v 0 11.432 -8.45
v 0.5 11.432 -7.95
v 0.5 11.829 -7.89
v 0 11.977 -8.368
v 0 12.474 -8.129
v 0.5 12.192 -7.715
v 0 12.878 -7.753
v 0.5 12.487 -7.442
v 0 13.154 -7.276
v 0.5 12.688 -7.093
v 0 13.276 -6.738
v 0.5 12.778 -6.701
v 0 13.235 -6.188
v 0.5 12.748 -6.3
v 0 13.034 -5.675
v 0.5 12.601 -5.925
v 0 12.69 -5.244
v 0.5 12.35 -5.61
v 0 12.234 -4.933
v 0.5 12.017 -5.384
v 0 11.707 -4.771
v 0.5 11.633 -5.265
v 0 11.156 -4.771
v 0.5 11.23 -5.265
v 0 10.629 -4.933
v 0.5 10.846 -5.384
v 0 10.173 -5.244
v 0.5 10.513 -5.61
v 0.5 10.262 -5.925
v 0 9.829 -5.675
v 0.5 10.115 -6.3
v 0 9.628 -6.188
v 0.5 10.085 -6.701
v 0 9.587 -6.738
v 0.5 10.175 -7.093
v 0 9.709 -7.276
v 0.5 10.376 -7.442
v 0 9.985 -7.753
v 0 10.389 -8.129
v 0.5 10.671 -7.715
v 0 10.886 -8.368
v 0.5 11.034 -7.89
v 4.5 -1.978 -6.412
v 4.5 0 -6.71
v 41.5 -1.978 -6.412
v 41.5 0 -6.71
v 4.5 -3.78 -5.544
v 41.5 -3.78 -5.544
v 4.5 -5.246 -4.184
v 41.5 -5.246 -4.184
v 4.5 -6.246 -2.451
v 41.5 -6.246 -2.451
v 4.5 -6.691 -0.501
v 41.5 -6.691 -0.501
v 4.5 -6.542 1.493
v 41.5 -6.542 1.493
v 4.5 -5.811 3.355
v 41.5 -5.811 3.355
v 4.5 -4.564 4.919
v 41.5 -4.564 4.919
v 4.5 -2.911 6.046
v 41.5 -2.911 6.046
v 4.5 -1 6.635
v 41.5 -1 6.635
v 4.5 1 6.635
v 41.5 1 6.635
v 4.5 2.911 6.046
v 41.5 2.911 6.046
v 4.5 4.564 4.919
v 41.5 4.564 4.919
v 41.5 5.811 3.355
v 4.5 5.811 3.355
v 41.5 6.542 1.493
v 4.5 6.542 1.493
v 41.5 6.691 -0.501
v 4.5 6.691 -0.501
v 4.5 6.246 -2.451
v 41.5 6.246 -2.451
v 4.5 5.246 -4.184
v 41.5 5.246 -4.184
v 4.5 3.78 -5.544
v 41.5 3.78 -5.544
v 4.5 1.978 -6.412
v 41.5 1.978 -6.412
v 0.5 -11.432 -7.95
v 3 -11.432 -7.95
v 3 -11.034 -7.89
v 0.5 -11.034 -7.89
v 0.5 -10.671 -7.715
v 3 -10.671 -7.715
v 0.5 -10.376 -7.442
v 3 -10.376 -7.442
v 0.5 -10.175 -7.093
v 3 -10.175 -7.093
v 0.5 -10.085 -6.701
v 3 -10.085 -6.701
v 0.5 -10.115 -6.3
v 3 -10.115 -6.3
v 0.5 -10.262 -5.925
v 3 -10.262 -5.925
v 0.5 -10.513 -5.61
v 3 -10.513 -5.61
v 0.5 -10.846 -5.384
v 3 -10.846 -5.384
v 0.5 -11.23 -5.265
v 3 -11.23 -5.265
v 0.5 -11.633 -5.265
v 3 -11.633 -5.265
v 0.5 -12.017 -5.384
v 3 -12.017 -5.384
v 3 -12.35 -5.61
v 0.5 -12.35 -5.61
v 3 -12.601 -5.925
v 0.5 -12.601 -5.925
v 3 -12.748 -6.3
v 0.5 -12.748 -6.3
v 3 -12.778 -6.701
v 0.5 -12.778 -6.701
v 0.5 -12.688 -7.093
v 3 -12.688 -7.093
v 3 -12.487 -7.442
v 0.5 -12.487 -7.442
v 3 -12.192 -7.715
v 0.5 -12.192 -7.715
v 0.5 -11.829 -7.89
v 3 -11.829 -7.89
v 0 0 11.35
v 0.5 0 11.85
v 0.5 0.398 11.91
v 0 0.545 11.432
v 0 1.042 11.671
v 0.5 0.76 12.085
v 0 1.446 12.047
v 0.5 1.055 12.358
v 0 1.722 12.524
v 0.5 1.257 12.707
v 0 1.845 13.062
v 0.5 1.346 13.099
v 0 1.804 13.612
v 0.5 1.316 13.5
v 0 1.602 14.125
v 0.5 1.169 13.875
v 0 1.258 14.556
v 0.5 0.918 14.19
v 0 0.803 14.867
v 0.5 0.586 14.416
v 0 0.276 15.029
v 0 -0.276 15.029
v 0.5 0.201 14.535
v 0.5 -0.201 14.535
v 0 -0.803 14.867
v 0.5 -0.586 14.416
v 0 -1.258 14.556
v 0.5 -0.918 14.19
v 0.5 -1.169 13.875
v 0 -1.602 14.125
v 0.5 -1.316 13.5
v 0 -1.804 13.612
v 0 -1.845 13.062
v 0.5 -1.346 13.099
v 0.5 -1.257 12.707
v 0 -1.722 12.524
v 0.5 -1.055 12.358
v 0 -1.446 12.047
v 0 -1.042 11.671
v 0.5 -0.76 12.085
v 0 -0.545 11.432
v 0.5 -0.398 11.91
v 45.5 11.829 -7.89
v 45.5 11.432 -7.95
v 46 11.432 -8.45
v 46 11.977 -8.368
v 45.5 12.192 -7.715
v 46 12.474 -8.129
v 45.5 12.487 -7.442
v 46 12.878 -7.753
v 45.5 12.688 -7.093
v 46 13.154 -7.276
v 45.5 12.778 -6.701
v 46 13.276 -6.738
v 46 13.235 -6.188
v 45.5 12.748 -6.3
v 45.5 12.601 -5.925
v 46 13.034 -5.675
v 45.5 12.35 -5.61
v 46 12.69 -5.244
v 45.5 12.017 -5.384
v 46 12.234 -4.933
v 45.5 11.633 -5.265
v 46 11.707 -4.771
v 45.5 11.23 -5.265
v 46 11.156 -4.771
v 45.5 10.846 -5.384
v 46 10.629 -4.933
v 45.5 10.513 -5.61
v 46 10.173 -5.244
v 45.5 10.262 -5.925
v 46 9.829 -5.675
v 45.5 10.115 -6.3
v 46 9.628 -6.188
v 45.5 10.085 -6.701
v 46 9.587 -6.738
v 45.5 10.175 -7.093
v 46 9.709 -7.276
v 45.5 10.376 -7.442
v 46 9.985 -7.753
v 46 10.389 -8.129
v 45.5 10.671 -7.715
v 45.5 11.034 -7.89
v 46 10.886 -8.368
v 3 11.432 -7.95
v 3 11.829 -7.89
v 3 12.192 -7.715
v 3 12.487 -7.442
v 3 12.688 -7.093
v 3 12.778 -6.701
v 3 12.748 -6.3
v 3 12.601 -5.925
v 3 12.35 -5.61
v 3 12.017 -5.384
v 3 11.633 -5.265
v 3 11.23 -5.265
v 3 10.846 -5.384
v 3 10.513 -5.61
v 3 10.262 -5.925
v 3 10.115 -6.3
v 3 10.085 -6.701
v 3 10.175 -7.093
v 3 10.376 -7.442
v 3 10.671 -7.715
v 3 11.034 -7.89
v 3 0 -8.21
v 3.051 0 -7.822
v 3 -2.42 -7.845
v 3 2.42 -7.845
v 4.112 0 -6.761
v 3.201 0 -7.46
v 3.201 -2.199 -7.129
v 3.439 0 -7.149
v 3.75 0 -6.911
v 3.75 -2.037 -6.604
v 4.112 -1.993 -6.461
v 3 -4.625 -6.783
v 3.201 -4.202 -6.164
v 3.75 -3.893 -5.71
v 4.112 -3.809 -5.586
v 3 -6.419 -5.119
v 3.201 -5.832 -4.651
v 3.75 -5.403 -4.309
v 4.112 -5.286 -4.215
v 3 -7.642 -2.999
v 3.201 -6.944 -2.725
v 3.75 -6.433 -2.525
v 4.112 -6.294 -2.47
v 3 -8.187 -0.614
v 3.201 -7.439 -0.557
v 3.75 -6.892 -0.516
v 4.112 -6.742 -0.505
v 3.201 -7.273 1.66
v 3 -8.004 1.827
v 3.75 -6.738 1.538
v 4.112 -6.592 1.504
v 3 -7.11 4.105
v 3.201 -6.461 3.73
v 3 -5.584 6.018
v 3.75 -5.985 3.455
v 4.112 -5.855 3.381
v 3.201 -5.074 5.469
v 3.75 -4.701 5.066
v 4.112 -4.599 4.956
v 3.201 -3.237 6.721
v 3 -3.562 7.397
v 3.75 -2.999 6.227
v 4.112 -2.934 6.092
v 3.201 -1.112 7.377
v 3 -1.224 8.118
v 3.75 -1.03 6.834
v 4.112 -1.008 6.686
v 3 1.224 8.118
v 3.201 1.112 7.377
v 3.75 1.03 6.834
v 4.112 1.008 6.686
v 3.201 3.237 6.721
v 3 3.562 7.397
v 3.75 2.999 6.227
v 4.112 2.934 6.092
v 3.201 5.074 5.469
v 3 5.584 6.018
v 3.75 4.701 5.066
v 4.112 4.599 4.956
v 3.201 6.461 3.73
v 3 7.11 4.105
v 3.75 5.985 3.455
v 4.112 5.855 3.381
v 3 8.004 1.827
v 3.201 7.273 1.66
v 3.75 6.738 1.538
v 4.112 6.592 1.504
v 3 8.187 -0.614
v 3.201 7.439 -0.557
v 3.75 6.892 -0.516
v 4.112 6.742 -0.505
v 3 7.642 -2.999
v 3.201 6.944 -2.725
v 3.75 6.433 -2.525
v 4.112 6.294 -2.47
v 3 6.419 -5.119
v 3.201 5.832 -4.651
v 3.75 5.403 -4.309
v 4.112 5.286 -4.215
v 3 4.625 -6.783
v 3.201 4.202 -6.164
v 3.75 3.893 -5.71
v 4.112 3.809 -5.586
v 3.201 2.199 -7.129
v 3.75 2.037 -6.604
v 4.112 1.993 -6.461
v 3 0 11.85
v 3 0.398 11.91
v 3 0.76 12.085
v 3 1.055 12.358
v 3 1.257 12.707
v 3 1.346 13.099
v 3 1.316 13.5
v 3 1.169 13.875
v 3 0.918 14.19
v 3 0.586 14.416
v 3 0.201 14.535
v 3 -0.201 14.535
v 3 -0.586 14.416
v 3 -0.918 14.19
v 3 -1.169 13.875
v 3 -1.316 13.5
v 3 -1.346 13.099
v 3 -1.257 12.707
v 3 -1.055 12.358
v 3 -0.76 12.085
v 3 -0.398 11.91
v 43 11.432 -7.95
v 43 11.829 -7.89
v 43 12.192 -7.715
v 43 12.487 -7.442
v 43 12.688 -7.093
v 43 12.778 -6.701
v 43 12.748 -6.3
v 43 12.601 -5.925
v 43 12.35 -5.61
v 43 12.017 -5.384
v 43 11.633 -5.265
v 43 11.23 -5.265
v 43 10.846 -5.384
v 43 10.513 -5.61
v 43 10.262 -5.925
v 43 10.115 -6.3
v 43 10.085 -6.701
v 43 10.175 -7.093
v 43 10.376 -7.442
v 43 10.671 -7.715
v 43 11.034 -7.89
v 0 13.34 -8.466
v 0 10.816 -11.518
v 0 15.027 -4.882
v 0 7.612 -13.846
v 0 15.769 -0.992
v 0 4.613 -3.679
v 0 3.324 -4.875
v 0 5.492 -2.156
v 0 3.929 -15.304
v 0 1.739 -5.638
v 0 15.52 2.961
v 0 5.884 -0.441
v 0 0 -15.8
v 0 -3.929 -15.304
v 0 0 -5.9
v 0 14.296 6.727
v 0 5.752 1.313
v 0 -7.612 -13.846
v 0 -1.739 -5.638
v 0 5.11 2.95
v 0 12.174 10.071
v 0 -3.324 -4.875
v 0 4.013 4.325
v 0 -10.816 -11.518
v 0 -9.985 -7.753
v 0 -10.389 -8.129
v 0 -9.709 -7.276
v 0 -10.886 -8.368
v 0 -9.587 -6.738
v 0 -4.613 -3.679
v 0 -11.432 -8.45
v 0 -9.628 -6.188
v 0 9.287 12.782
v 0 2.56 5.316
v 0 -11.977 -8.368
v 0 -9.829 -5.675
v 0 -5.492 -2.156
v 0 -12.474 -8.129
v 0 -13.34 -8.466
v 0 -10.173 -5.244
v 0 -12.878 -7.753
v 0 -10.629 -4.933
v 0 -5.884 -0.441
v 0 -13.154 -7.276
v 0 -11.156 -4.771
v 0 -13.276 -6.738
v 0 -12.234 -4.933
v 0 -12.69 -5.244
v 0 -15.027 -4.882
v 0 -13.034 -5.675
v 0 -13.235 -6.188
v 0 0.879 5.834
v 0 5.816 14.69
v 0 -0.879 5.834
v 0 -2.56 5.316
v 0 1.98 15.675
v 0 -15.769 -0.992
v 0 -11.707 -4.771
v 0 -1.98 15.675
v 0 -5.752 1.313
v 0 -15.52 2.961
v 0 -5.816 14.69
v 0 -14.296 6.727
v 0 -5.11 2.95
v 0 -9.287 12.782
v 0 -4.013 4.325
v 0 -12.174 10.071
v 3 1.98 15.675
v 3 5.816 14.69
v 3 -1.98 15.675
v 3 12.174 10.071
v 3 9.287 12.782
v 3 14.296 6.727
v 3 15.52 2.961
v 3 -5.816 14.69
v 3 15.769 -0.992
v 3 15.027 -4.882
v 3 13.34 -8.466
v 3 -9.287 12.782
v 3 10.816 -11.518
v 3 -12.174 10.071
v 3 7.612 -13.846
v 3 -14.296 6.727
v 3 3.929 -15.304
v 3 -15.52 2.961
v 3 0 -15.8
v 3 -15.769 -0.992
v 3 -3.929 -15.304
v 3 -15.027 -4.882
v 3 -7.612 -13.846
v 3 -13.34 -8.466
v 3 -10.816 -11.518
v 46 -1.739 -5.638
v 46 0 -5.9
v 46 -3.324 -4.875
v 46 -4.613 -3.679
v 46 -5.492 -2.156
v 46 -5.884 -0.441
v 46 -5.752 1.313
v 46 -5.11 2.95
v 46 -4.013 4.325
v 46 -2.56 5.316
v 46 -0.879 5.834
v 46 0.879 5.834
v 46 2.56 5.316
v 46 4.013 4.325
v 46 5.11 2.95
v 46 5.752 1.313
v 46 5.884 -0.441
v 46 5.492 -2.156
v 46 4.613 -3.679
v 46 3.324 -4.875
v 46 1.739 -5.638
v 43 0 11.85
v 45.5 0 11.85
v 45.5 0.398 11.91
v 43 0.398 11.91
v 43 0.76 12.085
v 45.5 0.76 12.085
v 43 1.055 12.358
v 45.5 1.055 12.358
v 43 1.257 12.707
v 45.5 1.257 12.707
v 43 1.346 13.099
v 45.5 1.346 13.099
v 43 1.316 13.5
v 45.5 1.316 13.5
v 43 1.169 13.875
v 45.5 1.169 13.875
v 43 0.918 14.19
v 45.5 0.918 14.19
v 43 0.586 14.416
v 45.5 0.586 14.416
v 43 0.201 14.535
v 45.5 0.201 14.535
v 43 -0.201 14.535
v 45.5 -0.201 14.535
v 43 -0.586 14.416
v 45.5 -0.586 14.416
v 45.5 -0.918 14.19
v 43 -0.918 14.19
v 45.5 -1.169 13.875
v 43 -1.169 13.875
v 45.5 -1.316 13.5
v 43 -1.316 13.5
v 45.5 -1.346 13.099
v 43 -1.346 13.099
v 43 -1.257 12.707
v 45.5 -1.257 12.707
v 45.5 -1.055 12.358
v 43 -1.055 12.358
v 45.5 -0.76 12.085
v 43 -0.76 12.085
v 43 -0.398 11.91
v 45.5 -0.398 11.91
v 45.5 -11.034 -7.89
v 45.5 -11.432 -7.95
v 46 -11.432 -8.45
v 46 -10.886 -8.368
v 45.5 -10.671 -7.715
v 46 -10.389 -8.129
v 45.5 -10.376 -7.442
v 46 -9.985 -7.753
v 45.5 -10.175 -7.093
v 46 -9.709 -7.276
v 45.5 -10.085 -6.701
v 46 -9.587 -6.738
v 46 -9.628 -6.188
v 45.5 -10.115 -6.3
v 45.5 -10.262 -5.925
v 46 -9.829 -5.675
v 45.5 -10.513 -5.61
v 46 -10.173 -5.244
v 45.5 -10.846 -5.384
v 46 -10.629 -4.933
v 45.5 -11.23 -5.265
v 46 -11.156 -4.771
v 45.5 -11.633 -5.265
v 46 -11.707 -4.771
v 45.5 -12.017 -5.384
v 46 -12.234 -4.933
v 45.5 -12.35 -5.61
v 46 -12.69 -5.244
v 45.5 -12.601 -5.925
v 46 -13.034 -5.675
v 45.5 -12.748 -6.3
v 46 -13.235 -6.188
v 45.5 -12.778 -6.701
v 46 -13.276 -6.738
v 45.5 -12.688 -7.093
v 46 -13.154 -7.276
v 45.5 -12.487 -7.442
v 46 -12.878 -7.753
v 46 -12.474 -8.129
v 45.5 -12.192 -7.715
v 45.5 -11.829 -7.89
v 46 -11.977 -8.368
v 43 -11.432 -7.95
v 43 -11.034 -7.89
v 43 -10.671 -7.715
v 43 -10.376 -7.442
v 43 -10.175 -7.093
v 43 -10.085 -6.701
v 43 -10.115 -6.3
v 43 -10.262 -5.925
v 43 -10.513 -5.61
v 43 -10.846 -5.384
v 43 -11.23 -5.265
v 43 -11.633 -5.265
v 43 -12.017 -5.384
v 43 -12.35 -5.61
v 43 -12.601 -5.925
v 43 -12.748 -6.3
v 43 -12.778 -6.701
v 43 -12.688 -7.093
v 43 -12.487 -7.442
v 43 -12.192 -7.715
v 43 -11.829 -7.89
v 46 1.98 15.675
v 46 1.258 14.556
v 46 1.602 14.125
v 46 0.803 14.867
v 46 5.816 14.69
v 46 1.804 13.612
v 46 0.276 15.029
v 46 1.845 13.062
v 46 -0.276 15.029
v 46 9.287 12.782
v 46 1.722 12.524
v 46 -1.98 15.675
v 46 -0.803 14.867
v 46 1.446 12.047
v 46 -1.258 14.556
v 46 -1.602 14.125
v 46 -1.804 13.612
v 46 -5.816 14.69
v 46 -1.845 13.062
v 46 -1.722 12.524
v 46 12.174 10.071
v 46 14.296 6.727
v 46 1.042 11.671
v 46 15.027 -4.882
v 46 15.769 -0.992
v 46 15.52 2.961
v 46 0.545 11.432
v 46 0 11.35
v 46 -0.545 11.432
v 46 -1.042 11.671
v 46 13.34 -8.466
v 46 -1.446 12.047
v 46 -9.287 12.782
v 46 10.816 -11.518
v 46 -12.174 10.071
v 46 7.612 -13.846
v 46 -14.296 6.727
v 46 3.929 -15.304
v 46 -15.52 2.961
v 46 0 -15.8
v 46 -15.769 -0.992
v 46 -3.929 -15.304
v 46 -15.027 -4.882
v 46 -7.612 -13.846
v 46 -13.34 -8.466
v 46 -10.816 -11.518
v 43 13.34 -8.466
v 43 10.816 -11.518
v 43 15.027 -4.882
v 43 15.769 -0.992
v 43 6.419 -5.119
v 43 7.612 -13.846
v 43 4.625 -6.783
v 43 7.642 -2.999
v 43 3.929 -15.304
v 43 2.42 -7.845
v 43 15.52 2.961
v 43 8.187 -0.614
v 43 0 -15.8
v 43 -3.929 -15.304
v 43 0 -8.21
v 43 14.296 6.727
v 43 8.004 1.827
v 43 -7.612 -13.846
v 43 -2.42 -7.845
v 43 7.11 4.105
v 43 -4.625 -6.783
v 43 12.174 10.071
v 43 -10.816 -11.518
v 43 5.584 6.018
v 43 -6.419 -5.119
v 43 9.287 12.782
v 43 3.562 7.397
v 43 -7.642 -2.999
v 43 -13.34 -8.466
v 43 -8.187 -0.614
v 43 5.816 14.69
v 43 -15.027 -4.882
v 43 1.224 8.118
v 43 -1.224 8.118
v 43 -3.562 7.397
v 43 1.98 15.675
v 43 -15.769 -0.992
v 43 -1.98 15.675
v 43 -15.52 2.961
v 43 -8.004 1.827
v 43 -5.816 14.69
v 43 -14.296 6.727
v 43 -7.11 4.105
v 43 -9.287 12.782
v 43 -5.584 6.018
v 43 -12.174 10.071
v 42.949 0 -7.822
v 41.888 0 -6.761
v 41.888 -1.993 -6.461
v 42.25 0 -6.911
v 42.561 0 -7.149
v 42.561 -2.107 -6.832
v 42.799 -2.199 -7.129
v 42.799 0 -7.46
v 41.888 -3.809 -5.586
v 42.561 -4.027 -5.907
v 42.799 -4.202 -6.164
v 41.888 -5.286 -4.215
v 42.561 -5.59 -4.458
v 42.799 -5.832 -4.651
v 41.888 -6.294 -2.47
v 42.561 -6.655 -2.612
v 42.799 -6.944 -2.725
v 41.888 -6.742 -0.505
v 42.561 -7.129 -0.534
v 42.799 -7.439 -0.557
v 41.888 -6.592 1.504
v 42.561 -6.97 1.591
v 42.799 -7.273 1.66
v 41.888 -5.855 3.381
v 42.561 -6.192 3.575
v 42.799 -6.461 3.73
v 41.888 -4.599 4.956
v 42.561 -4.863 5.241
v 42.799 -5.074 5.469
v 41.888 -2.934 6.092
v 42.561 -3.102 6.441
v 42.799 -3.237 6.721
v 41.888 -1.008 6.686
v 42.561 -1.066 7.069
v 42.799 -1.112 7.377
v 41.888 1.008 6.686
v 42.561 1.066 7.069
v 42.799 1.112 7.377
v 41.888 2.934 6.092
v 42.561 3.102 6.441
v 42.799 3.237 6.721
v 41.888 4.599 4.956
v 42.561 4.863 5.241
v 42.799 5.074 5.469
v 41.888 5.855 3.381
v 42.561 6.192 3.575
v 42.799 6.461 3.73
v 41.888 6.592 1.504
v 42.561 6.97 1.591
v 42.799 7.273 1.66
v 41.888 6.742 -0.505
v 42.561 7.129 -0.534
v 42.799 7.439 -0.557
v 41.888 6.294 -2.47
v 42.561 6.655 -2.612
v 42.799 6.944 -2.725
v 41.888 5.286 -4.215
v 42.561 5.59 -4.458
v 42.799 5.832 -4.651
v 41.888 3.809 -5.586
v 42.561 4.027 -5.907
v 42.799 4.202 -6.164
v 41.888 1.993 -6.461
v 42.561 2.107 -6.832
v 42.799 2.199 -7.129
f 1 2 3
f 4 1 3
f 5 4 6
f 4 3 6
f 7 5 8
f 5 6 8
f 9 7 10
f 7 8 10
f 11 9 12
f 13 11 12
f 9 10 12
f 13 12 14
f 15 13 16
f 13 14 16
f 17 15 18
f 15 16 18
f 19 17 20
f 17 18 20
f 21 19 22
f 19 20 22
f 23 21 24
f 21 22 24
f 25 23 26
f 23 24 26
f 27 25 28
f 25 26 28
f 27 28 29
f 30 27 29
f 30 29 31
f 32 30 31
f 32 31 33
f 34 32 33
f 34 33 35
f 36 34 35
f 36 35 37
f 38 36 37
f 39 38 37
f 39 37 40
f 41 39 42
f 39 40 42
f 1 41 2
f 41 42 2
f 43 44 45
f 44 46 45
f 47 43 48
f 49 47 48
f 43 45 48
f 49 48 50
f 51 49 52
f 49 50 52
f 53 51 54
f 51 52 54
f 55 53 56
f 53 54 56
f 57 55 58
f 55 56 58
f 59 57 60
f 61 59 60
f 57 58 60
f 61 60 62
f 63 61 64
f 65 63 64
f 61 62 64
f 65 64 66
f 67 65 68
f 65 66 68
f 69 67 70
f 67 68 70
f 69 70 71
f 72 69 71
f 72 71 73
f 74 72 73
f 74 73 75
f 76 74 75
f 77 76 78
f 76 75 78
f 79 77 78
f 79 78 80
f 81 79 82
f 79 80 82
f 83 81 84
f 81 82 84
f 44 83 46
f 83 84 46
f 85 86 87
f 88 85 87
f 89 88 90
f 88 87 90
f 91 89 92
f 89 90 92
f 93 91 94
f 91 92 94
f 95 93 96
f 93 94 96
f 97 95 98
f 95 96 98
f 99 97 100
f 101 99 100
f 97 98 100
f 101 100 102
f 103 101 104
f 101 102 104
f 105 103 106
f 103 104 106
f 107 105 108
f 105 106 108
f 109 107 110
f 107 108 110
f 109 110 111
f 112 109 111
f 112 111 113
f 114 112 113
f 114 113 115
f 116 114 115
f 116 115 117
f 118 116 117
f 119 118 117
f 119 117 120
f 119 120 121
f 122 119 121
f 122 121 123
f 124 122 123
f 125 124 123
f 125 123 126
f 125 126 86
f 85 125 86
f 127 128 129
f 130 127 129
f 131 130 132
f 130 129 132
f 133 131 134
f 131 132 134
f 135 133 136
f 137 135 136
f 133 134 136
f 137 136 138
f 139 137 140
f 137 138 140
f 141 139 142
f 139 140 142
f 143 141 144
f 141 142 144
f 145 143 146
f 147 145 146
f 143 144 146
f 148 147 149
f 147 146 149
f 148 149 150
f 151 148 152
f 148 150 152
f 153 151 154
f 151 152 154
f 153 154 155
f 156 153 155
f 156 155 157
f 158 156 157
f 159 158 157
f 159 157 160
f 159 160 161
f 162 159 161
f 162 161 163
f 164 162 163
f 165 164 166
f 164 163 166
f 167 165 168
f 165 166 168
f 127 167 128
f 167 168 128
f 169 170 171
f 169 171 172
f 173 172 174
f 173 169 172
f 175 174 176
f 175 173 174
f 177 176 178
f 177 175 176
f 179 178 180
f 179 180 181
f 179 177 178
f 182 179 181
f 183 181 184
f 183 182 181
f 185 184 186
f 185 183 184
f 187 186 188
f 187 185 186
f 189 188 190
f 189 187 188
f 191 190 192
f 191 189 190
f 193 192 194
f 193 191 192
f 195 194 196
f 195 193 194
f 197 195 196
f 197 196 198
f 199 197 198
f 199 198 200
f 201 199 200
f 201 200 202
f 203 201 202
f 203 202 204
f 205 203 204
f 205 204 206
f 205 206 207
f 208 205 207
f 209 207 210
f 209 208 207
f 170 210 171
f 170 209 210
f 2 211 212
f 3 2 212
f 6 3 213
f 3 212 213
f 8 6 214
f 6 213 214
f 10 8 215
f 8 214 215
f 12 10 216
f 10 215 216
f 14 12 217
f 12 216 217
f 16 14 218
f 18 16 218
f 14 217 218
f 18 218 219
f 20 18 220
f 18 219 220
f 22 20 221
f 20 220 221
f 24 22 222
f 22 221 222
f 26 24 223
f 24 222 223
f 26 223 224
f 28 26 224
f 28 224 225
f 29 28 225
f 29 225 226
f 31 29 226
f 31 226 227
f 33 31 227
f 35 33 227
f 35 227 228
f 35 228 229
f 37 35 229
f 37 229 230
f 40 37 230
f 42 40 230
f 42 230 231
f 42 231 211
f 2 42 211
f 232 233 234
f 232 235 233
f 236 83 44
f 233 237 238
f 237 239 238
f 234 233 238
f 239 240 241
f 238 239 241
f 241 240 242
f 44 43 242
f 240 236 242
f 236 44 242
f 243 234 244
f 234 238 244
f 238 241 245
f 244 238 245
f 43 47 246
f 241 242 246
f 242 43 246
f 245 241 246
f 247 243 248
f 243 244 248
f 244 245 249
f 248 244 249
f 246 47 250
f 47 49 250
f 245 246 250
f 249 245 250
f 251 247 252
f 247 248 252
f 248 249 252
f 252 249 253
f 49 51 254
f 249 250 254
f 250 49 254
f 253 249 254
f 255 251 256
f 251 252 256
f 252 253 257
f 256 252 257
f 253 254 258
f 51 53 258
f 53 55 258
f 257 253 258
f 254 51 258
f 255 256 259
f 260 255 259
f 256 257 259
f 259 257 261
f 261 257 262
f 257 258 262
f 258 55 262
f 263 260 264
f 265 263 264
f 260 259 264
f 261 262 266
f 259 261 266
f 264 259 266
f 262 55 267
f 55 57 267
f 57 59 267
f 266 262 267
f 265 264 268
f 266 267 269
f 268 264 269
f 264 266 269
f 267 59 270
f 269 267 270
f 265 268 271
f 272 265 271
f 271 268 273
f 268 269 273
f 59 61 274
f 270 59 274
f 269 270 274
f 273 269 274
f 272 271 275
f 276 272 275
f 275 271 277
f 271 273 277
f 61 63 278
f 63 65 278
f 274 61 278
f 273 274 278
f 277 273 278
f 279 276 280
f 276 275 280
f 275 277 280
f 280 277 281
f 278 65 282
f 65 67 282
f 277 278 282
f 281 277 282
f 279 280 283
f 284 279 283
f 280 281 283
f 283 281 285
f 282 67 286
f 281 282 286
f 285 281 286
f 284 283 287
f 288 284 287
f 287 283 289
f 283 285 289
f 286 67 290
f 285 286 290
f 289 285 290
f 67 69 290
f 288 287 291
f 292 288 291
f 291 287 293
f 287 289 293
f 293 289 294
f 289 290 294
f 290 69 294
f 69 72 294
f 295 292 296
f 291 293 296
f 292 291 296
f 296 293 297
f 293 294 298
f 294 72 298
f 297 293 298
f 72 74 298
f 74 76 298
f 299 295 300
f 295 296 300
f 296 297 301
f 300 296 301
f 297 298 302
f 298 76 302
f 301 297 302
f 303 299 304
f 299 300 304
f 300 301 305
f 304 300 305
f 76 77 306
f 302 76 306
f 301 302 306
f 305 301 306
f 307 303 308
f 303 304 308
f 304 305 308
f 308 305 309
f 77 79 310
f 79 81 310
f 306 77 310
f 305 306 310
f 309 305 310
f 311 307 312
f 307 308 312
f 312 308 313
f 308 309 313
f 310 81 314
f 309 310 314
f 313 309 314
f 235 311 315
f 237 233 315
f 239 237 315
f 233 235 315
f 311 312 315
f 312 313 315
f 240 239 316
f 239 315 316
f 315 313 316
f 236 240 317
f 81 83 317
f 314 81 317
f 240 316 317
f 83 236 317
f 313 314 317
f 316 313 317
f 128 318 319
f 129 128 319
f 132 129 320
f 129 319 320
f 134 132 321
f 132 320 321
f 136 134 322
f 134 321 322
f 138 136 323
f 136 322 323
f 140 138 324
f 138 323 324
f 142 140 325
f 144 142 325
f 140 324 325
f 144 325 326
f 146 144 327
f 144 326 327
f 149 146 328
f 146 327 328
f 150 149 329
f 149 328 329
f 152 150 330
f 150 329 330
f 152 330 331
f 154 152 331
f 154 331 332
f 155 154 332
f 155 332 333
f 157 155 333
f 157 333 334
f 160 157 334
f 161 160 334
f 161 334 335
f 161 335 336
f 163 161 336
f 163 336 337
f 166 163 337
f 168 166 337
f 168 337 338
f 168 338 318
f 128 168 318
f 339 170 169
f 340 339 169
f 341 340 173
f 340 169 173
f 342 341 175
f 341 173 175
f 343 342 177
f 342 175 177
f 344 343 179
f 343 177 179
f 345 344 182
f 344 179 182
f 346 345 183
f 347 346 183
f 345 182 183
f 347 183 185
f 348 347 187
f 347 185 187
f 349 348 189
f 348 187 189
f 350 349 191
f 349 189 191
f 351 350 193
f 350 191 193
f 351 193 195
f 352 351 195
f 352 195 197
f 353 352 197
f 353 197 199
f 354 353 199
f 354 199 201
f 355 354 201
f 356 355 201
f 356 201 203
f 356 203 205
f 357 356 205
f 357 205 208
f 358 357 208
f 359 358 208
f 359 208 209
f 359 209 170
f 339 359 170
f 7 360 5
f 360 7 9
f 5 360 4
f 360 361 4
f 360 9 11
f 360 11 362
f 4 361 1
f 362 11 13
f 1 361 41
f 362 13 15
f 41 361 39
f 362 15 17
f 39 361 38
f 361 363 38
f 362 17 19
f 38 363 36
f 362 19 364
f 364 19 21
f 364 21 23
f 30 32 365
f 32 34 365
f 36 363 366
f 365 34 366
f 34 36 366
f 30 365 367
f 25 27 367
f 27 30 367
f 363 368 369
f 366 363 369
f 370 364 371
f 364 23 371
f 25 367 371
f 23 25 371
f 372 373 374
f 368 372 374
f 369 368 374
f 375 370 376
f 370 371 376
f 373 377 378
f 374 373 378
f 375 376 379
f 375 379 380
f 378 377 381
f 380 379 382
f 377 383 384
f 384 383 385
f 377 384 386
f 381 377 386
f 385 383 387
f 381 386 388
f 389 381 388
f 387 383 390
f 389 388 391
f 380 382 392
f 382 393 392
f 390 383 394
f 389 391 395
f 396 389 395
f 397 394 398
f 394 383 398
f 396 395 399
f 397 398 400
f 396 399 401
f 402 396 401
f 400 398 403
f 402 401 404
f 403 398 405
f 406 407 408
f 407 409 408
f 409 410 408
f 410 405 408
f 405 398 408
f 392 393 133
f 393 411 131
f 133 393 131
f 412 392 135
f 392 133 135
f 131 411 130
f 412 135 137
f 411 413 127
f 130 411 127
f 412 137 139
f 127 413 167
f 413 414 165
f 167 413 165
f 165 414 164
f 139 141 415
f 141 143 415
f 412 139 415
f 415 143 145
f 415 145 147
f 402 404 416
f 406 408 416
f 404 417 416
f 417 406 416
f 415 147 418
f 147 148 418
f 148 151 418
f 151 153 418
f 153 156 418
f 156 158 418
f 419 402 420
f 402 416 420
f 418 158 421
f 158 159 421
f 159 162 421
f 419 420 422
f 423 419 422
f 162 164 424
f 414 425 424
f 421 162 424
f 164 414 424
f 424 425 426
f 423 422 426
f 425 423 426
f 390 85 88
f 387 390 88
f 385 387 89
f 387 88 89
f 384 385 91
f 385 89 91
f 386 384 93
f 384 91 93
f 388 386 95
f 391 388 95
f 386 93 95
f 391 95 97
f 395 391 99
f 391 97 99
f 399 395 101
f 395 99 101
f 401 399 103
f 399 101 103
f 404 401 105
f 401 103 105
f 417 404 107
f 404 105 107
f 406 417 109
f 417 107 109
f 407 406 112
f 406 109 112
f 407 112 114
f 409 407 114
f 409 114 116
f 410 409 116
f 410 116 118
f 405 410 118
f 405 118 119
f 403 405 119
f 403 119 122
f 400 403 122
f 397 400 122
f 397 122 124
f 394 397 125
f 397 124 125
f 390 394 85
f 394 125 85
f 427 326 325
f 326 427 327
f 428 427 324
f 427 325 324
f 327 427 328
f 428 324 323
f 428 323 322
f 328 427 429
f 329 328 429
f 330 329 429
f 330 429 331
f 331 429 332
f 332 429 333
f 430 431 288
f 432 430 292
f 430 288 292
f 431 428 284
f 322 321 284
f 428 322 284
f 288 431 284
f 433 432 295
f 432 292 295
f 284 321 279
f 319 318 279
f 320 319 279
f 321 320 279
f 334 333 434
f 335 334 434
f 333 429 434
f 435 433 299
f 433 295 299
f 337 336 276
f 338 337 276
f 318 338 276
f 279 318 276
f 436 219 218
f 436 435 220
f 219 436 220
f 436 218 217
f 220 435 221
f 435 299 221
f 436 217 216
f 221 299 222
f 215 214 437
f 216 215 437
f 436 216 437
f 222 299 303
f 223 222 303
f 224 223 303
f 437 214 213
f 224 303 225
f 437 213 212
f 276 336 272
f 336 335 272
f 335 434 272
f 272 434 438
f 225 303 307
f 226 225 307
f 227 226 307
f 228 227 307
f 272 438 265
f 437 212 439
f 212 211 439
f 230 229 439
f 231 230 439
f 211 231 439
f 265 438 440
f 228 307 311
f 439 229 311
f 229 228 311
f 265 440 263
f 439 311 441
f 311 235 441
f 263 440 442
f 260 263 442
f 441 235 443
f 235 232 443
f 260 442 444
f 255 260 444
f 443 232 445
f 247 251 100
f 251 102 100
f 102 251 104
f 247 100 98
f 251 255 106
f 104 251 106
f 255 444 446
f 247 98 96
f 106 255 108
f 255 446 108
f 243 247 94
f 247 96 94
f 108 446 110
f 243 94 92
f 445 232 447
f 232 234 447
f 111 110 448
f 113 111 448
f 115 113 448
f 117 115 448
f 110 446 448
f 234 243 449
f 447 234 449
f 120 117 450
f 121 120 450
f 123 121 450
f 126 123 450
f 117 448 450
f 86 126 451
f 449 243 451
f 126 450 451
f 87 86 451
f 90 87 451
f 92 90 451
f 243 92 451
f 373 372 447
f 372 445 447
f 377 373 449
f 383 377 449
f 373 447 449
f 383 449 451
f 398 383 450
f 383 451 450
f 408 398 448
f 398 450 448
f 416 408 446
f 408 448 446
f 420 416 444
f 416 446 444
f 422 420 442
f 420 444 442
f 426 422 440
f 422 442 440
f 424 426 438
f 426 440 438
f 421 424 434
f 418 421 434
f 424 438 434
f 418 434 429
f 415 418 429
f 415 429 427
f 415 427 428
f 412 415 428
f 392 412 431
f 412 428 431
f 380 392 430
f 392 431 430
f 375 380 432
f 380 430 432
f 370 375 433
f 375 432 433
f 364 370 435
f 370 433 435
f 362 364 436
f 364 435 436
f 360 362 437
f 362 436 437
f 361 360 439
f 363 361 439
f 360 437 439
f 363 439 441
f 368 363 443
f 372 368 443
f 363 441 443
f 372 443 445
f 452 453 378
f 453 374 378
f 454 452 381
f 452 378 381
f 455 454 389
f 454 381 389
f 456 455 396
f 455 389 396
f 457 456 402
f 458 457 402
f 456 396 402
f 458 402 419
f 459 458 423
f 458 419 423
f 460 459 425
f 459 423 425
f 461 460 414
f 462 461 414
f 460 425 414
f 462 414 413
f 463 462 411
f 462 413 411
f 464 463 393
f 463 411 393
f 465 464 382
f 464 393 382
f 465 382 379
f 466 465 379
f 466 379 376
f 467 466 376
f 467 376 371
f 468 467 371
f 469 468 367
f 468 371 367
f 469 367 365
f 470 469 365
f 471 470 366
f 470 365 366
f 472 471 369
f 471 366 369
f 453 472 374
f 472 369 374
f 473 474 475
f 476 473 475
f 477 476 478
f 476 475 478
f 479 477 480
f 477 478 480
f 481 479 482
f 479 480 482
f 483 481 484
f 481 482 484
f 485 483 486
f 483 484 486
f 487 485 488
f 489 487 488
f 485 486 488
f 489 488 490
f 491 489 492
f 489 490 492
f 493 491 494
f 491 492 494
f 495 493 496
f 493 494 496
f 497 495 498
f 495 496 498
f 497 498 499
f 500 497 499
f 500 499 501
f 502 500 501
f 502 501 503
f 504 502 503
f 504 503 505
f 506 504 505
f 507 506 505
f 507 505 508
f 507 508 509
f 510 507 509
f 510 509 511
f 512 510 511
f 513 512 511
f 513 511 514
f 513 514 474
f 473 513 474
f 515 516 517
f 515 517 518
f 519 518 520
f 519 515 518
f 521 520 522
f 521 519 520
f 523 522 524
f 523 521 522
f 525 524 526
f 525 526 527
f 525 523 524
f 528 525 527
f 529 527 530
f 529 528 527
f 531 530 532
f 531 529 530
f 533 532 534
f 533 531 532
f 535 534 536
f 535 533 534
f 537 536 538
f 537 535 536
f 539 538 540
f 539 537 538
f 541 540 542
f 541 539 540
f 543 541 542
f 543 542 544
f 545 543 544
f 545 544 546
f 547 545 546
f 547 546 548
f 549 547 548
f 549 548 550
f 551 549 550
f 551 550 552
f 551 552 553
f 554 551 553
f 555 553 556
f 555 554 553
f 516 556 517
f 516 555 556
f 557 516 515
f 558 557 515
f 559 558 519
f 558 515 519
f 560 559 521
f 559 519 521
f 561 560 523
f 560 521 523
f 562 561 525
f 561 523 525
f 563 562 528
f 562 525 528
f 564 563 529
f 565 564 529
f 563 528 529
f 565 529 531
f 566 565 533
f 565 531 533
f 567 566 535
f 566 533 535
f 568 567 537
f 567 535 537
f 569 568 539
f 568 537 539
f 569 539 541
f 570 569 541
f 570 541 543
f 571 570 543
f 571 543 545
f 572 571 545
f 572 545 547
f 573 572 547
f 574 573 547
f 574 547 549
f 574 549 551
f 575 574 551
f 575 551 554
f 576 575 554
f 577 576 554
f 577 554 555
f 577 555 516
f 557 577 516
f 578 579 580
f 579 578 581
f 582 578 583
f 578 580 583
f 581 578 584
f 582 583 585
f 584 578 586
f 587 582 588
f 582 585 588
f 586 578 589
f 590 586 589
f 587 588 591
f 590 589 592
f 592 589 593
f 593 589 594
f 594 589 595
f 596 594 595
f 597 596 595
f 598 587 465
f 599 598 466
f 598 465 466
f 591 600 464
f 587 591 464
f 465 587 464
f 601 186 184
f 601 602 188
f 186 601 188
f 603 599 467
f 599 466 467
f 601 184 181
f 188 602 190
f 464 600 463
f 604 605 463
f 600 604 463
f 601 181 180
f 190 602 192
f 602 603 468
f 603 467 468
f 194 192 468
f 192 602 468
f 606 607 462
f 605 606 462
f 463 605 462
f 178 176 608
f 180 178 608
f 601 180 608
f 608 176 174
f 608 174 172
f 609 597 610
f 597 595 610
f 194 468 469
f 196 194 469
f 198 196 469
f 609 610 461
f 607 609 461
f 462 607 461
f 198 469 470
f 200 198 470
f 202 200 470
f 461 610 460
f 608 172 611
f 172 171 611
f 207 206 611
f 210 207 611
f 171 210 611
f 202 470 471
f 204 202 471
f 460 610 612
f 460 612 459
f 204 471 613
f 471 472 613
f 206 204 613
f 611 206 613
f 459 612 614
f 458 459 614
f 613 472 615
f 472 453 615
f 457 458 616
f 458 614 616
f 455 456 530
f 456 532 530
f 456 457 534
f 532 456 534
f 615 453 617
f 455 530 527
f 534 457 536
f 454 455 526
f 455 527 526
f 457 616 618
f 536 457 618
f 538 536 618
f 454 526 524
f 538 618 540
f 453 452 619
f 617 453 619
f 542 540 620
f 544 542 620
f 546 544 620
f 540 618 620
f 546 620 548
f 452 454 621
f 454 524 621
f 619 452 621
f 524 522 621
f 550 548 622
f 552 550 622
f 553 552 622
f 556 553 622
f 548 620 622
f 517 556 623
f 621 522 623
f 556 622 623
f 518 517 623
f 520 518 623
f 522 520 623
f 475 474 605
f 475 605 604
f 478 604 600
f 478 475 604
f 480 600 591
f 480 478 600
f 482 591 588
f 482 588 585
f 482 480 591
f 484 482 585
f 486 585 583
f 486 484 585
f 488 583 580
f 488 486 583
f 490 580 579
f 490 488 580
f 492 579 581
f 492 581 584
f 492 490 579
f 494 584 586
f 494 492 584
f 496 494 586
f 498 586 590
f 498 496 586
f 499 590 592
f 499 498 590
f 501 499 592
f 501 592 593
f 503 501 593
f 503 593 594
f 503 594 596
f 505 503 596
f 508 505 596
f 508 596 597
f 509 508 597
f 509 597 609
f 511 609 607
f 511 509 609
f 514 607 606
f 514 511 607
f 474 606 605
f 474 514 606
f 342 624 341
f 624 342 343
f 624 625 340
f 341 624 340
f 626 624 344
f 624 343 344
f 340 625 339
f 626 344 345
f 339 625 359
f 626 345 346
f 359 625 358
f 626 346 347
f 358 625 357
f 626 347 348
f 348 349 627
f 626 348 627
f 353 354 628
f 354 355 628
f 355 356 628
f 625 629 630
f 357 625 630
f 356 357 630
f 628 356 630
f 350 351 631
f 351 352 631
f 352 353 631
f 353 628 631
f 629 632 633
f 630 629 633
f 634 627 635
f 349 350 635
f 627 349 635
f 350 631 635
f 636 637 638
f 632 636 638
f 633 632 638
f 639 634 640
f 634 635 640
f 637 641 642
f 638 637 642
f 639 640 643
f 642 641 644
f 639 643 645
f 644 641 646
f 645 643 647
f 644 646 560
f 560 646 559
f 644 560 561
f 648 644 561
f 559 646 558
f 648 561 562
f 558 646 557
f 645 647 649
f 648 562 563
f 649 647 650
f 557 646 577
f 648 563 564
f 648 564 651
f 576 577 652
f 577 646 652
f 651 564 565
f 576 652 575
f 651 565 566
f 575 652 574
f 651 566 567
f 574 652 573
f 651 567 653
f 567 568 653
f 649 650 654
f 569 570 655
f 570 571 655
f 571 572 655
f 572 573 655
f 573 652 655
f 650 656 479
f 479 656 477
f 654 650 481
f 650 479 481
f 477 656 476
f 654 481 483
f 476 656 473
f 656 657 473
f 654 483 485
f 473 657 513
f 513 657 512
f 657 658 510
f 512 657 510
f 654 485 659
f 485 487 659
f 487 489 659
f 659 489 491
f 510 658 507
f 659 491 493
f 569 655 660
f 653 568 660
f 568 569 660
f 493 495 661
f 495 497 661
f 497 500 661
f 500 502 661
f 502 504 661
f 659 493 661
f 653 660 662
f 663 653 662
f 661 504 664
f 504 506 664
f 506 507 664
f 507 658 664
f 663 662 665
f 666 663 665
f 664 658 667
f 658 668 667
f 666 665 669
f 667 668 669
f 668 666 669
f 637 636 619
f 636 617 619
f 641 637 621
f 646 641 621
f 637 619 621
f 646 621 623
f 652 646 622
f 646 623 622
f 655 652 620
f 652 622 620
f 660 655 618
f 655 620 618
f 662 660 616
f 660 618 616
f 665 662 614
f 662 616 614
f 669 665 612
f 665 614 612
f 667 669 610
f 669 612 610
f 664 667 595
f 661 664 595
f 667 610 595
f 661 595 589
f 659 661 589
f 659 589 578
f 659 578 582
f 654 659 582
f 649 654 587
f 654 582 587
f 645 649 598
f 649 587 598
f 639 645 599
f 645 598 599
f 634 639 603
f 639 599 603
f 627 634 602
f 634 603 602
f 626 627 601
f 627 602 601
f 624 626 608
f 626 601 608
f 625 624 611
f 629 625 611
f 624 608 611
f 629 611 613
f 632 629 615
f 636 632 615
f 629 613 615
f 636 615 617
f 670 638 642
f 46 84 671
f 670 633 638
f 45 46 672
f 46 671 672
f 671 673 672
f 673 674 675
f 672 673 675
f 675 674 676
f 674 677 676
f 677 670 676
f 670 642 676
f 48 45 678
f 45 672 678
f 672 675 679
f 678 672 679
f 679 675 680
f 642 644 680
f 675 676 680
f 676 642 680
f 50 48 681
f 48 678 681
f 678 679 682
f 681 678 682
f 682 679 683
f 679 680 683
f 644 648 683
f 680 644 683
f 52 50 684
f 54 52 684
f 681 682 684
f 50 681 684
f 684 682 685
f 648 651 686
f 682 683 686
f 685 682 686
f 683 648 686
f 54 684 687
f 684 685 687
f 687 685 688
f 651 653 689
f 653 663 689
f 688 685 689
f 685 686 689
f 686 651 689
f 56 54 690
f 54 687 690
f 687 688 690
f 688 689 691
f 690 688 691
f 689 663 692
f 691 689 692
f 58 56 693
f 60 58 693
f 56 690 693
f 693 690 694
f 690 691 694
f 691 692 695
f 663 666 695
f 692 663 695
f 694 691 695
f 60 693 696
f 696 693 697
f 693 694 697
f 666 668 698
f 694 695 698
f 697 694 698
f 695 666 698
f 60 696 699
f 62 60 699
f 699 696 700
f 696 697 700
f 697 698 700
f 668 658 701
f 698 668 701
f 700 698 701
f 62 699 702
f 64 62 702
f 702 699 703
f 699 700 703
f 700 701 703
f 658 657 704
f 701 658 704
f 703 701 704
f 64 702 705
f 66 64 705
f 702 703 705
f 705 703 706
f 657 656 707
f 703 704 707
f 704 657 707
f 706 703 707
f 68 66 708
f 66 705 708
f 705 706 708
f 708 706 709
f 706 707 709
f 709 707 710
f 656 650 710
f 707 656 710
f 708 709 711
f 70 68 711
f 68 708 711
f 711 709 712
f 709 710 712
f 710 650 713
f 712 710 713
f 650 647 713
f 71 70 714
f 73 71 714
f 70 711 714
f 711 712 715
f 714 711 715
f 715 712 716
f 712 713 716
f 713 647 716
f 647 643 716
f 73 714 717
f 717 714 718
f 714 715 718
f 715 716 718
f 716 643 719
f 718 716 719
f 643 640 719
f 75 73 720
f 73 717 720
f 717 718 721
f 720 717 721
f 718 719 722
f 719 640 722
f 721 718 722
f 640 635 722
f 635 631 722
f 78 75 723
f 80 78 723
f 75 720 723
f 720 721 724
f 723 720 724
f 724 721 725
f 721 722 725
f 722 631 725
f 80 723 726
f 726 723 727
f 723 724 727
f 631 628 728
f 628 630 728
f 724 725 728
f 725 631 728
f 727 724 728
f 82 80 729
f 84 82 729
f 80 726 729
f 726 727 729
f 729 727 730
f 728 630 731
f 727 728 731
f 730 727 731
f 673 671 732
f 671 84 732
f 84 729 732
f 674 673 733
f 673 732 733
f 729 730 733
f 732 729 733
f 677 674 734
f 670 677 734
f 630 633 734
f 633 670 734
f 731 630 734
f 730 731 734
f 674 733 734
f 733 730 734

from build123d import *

# Parameters (mm, degrees)
SKETCH3_R          = 1.35
CUT_EXTRUDE1_DEPTH = 52.139808369
CHAMFER1_SIZE      = 0.5


with BuildPart() as part:
    # Sketch1 → Revolve1 (revolve)
    with BuildSketch(Plane.XY, mode=Mode.PRIVATE) as revolve1_sk:
        with BuildLine():
            Line((0, 5.9), (0, 15.8))
            Line((0, 15.8), (3, 15.8))
            Line((3, 15.8), (3, 8.21))
            ThreePointArc((3, 8.21), (3.439339828, 7.149339828), (4.5, 6.71))
            Line((4.5, 6.71), (41.5, 6.71))
            ThreePointArc((41.5, 6.71), (42.560660172, 7.149339828), (43, 8.21))
            Line((43, 8.21), (43, 15.8))
            Line((43, 15.8), (46, 15.8))
            Line((46, 15.8), (46, 5.9))
            Line((46, 5.9), (43, 5.9))
            Line((43, 5.9), (3, 5.9))
            Line((3, 5.9), (0, 5.9))
        make_face()
    revolve(revolve1_sk.sketch.rotate(Axis((0, 0, 0), (-1, 0, 0)), 90), axis=Axis((0, 0, 0), (-1, 0, 0)))

    # Sketch3 → Cut-Extrude1 (cut, through all)
    with BuildSketch(Plane(origin=(46, 0, 0), x_dir=(0, 0, -1), z_dir=(1, 0, 0))):
        with Locations((-13.2, 0)):
            Circle(SKETCH3_R)
        with Locations((6.6, 11.43153533)):
            Circle(SKETCH3_R)
        with Locations((6.6, -11.43153533)):
            Circle(SKETCH3_R)
    extrude(amount=-CUT_EXTRUDE1_DEPTH, mode=Mode.SUBTRACT)

    # Chamfer1
    chamfer1_edges = [part.edges().sort_by_distance(p)[0] for p in [
        (0, 0, 14.55),
        (46, 0, 14.55),
        (0, 11.43153533, -5.25),
        (46, 11.43153533, -5.25),
        (0, -11.43153533, -5.25),
        (46, -11.43153533, -5.25),
    ]]
    chamfer(chamfer1_edges, length=CHAMFER1_SIZE)


solid = part.part
